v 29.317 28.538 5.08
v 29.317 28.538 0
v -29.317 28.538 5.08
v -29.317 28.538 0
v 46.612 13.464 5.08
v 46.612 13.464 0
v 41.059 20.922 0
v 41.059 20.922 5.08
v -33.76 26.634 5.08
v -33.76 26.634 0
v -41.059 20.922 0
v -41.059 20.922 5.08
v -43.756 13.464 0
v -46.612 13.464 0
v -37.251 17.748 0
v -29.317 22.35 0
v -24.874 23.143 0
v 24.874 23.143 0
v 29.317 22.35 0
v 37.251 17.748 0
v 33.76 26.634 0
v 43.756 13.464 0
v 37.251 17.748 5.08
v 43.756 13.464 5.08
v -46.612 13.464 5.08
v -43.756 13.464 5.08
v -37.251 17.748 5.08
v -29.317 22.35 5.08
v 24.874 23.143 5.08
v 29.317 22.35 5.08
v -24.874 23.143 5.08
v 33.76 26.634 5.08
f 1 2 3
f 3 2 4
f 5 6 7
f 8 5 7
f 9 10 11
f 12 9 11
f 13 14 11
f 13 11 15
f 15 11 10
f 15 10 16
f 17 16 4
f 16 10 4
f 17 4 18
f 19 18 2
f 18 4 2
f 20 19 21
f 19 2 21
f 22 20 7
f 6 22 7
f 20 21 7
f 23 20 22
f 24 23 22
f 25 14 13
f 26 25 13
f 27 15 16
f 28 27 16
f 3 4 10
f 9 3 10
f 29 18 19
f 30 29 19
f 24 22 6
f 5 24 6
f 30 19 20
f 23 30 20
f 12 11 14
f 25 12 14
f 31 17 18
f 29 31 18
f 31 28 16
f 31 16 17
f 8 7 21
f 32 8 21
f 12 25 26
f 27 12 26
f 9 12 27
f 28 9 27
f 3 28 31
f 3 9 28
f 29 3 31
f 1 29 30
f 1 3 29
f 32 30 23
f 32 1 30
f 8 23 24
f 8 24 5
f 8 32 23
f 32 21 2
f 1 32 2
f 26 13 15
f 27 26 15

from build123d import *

# Parameters (mm, degrees)
F0_W     = 24.8743314296
F0_H     = 5.394872278
F1_DEPTH = 5.08


with BuildPart() as f1:
    # F0 (on Top) → F1 (new body)
    with BuildSketch(Plane.XY):
        with Locations((-12.4371657148, 25.8406065404)):
            Rectangle(F0_W, F0_H)
        with Locations((12.4371657148, 25.8406065404)):
            Rectangle(F0_W, F0_H)
        Polygon((-24.8743314296, 23.1431704015), (-24.8743314296, 28.5380426794), (-29.3171685189, 28.5380426794), (-33.7600037456, 26.6339704394), (-41.0589501262, 20.9217518568), (-46.6124974191, 13.4641341865), (-43.7563844025, 13.4641341865), (-37.2508056462, 17.7482981235), (-29.3171685189, 22.3498065025), align=None)
        Polygon((29.3171685189, 28.5380426794), (24.8743314296, 28.5380426794), (24.8743314296, 23.1431704015), (29.3171685189, 22.3498065025), (37.2508056462, 17.7482981235), (43.7563844025, 13.4641341865), (46.6124974191, 13.4641341865), (41.0589501262, 20.9217518568), (33.7600037456, 26.6339704394), align=None)
    extrude(amount=F1_DEPTH)


solid = f1.part
